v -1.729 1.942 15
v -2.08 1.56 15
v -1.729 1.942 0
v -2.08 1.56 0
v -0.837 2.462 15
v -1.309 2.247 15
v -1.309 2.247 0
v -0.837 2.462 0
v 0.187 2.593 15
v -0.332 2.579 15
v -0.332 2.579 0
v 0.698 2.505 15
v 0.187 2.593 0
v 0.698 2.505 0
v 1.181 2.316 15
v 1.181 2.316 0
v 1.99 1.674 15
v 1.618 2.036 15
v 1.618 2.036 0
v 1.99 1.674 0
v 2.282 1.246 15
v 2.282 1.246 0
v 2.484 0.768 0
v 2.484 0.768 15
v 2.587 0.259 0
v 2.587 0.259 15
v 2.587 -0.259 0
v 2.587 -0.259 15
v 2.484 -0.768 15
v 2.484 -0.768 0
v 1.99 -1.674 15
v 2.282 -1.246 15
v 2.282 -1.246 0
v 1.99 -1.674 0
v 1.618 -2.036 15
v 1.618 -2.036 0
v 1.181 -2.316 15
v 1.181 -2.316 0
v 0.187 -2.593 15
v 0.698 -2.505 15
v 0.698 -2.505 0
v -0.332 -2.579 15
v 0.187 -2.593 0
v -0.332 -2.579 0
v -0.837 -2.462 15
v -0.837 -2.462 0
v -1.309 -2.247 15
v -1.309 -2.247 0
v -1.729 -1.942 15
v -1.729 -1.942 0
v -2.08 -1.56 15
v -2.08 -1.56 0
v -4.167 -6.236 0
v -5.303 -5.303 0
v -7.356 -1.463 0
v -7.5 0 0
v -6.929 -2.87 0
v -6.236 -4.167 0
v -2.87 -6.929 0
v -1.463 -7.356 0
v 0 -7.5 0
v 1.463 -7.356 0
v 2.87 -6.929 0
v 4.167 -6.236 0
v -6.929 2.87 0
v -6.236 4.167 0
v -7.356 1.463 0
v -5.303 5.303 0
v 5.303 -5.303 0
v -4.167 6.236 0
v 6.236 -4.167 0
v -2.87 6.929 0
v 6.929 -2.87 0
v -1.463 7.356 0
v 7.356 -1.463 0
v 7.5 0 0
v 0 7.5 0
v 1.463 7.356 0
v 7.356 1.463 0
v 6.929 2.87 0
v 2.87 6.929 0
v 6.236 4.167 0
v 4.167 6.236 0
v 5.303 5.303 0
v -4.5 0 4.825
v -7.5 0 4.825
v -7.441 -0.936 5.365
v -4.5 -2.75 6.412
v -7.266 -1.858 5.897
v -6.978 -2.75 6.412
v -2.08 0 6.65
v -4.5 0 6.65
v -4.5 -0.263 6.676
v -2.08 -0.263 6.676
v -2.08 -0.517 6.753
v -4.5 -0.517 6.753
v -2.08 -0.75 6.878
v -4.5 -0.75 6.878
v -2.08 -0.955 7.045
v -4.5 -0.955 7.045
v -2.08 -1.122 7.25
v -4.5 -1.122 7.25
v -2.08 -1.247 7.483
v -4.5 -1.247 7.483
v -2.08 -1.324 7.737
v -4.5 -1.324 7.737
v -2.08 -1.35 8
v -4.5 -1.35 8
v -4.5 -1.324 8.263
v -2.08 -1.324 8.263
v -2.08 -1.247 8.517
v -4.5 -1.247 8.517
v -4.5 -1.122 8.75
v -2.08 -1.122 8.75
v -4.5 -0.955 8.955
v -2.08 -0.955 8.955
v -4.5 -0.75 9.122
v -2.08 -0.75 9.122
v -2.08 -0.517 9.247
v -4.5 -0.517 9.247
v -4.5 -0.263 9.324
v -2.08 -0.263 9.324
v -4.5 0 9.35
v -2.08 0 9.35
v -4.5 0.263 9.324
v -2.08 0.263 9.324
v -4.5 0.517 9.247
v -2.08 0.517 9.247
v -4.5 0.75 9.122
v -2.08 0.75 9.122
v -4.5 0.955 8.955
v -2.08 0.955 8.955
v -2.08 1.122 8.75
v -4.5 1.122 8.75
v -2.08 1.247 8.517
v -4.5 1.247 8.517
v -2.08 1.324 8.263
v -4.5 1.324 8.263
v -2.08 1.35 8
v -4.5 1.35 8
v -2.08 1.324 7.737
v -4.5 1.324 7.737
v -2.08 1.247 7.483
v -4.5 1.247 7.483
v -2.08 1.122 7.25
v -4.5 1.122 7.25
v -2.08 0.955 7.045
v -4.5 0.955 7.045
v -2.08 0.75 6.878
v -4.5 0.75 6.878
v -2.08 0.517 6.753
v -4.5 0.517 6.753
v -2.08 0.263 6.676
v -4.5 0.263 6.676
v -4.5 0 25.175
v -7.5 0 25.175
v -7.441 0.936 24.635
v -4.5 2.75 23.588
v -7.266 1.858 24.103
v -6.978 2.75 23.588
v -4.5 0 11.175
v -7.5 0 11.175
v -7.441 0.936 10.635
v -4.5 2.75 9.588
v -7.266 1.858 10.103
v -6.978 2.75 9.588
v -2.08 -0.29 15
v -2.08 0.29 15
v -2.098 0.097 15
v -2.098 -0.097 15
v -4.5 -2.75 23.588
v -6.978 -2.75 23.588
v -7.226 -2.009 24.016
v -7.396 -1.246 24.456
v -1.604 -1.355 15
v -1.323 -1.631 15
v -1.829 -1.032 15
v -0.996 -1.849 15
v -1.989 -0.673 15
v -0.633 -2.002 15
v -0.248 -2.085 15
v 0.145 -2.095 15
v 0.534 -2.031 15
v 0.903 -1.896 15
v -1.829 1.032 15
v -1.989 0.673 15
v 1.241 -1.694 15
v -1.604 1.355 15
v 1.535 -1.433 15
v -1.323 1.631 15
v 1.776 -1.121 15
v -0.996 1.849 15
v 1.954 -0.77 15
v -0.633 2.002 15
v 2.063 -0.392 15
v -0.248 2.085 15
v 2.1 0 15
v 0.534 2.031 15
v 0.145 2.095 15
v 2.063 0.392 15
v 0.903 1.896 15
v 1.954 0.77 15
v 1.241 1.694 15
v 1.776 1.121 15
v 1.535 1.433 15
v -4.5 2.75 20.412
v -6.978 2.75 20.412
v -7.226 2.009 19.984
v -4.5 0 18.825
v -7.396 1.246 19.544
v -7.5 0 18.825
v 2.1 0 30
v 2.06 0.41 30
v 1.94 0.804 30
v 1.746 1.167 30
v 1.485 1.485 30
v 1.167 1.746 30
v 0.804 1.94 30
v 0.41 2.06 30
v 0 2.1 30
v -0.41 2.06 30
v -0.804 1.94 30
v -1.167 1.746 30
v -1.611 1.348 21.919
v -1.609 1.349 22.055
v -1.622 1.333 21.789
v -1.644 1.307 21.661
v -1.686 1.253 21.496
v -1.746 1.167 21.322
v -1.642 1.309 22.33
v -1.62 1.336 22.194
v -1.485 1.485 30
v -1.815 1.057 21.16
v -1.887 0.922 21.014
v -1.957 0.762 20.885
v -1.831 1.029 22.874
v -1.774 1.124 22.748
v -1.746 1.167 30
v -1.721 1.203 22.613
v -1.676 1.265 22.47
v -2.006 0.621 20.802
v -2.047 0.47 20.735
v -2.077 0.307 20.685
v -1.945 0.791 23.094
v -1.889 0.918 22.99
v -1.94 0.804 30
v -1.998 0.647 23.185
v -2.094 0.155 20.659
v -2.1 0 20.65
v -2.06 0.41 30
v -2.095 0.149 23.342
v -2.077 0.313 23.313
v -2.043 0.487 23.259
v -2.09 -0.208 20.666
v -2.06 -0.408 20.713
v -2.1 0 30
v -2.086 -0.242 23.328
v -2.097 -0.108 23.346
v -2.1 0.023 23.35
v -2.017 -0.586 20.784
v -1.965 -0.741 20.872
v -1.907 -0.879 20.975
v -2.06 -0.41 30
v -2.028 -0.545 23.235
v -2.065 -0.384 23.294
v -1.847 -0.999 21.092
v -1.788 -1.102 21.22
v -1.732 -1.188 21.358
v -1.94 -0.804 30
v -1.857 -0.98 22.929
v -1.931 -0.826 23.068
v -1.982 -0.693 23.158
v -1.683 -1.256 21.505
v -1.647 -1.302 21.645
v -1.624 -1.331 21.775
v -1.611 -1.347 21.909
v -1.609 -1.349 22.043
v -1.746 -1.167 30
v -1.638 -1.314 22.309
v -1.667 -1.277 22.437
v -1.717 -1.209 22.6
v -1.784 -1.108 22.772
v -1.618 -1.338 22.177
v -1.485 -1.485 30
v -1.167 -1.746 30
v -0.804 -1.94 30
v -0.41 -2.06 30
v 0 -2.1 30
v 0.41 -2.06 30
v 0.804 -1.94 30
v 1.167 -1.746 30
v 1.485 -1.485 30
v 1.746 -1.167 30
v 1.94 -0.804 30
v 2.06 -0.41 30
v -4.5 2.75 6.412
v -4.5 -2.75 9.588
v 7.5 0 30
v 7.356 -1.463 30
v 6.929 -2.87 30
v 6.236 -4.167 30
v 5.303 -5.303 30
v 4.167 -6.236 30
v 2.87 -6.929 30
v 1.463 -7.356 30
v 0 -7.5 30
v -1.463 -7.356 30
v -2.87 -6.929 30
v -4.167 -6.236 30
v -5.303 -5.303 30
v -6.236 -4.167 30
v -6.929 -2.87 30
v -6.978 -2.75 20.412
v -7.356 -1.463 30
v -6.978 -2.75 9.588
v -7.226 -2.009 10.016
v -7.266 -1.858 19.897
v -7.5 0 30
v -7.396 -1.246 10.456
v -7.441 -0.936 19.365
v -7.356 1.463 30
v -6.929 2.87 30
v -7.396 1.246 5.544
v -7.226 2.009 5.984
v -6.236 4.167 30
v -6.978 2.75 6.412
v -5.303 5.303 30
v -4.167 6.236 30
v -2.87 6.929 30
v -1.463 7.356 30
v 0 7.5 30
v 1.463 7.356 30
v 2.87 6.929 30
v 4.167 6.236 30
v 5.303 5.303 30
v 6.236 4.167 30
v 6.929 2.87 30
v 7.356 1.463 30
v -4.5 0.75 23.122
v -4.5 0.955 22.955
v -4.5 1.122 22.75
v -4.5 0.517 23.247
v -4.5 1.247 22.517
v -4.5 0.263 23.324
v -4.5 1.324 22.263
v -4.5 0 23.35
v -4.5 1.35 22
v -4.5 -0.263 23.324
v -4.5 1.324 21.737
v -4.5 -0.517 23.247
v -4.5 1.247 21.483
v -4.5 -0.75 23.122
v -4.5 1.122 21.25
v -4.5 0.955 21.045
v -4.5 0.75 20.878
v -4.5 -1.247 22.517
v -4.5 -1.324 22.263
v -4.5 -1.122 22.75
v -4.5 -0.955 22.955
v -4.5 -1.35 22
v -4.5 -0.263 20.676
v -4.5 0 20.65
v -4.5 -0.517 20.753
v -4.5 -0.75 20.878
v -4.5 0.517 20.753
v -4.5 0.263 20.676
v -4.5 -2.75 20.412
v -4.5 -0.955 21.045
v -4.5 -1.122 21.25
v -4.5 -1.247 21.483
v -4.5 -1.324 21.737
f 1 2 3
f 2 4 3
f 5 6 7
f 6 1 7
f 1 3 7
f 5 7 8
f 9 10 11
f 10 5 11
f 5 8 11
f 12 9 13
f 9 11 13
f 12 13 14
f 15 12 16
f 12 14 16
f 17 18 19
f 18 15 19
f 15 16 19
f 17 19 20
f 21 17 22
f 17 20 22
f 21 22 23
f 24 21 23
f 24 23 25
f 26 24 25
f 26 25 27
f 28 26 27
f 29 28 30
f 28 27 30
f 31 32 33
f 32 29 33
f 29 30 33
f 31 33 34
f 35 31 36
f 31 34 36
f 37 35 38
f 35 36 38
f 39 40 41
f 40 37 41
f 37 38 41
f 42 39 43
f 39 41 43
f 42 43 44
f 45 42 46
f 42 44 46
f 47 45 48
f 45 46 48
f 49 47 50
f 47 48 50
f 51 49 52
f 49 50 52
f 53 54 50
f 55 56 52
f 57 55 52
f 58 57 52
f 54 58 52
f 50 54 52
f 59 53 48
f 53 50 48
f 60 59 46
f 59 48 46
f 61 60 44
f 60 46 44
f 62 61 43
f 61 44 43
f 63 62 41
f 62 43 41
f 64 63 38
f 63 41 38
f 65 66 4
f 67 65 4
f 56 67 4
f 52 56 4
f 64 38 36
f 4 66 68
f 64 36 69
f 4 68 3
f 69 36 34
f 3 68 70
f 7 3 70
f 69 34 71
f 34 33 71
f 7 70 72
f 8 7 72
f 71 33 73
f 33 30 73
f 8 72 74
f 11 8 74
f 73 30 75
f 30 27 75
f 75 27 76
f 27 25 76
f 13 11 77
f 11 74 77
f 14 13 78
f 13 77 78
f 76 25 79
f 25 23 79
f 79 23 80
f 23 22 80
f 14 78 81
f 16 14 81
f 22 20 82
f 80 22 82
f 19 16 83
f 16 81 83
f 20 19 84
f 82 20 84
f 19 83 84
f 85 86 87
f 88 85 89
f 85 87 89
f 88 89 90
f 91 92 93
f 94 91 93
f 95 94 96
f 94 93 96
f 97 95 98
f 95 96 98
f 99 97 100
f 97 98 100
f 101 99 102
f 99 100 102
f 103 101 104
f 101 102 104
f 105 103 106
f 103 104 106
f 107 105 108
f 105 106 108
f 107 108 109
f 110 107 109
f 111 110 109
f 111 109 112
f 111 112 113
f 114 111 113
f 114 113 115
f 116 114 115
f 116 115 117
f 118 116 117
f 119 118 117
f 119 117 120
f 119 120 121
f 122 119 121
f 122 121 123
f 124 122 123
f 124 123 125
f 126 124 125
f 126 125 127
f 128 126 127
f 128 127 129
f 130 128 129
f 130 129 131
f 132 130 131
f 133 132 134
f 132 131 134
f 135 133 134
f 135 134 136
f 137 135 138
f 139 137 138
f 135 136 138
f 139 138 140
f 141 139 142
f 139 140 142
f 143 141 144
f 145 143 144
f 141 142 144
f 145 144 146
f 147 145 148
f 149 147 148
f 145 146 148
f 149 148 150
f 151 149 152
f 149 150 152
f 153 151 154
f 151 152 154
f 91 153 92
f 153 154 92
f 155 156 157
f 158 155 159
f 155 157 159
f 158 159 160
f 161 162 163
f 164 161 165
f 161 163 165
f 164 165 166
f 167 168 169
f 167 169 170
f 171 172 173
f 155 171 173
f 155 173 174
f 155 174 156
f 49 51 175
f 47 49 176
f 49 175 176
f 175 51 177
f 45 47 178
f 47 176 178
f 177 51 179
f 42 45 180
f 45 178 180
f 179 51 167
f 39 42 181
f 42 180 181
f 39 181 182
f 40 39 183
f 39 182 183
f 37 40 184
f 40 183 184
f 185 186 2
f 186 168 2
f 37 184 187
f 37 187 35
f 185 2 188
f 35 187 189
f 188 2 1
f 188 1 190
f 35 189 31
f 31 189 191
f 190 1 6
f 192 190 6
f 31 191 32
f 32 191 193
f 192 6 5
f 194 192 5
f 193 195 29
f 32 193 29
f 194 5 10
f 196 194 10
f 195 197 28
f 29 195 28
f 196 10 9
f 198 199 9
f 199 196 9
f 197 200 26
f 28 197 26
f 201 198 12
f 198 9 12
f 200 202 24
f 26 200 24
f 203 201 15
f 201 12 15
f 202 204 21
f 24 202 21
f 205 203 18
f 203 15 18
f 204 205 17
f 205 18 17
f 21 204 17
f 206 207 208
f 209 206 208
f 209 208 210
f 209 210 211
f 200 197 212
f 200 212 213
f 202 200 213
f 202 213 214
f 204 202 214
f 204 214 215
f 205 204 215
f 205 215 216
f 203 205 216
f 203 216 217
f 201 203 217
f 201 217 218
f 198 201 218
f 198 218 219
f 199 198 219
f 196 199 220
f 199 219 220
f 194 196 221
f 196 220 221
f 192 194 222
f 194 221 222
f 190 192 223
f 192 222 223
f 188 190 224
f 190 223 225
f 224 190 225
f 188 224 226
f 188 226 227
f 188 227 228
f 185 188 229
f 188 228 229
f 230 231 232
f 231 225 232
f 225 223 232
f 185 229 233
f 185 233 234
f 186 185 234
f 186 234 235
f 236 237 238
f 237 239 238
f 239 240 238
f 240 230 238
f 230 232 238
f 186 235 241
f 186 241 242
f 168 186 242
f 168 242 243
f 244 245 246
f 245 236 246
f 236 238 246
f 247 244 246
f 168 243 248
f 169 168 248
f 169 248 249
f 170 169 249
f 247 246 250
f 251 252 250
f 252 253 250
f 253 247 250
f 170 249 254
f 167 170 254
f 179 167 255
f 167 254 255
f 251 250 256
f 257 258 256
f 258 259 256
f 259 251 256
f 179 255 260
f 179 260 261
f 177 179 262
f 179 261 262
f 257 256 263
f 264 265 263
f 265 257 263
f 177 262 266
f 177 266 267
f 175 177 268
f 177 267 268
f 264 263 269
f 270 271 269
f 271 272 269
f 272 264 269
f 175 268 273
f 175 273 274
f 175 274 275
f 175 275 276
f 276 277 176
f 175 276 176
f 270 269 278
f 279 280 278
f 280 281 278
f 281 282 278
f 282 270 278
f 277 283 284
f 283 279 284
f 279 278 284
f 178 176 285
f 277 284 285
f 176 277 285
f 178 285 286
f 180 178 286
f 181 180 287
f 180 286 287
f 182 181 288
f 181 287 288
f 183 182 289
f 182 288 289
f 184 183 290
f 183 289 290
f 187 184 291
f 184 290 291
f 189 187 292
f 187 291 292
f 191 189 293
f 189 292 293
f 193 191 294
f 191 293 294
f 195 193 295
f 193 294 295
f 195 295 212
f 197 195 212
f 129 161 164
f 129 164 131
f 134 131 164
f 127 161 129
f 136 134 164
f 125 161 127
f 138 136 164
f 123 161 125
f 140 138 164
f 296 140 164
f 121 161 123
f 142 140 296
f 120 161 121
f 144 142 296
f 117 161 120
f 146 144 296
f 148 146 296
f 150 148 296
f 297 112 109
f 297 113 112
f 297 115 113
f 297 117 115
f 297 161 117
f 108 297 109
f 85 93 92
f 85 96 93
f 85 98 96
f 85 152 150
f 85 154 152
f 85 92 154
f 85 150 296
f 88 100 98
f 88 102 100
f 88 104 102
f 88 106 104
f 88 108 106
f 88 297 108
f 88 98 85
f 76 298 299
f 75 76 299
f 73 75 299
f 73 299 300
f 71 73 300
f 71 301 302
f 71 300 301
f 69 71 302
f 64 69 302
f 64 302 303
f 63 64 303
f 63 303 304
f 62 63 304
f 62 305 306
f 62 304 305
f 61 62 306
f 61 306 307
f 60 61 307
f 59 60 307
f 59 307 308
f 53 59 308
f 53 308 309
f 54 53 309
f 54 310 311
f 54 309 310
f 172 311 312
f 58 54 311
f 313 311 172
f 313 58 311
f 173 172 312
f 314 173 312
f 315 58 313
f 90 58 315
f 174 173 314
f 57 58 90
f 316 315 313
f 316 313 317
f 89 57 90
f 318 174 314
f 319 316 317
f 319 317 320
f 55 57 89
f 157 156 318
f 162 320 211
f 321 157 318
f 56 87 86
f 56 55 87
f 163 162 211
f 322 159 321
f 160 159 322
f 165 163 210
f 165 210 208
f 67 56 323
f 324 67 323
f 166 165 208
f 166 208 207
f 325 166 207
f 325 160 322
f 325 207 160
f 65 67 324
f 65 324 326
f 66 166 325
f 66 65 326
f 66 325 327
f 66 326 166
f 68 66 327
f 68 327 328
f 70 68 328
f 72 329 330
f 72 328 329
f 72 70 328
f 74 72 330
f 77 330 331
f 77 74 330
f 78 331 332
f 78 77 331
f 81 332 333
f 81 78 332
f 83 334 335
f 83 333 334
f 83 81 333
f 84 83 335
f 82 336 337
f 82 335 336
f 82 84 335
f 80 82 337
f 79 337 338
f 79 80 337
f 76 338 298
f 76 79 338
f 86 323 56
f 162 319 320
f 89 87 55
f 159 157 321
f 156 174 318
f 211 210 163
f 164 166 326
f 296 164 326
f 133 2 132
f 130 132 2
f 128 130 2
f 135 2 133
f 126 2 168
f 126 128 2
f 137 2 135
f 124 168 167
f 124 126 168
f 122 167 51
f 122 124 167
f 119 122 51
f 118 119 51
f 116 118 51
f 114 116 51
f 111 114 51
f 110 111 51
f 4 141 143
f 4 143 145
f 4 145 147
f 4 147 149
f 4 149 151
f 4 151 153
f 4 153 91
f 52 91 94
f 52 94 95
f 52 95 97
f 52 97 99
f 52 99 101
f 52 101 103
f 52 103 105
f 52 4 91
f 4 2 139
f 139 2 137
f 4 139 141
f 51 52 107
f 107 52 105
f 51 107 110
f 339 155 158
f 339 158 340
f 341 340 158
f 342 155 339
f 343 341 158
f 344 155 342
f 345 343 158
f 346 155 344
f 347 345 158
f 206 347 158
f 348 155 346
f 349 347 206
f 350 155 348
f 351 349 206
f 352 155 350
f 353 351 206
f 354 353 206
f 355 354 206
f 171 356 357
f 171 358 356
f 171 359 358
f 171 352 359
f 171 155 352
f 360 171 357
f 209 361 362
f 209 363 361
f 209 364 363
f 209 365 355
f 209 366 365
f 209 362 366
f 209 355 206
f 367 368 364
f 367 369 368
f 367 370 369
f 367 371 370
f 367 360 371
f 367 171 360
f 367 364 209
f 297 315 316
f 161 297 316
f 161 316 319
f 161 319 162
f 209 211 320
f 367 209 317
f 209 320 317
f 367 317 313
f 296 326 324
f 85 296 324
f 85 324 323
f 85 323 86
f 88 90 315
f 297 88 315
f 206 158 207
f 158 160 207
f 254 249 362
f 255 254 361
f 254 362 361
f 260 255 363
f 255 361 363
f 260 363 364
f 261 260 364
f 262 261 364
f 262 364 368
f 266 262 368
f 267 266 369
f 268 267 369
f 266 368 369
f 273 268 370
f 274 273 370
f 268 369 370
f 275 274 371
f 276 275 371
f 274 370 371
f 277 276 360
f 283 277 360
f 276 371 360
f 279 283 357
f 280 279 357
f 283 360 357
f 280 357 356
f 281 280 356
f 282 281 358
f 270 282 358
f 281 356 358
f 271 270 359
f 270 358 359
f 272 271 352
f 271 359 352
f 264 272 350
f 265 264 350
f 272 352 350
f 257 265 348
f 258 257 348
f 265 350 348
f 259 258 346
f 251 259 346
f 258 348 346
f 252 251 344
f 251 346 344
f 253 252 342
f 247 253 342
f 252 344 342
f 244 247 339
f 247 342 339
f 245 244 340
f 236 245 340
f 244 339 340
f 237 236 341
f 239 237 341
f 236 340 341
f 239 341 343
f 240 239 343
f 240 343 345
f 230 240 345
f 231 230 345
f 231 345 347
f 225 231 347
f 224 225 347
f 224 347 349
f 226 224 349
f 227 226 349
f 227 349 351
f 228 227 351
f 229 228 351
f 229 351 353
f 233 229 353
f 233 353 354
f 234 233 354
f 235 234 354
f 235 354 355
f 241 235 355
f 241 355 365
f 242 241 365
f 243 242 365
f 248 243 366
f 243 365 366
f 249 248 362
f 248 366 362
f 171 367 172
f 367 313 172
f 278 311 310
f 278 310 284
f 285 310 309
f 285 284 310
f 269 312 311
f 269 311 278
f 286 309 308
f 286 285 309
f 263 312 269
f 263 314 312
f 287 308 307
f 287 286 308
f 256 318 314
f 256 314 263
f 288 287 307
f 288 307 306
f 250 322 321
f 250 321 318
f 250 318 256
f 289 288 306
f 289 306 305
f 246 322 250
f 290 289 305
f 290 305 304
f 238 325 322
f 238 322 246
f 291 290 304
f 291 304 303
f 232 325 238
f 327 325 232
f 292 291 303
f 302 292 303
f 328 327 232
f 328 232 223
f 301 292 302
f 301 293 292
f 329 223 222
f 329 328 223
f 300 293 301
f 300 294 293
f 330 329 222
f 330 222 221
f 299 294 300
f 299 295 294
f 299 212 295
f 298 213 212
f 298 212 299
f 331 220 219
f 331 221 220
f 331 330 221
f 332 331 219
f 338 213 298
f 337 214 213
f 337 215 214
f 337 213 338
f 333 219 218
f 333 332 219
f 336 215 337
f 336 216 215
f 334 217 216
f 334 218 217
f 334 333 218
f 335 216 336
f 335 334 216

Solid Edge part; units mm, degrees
sketch "Sketch1" plane through (0, 0, 0) normal (0, 0, 1) x (1, 0, 0)
  circle A0 centre (0, 0) radius 7.5
  dimension "D1" = 15
extrude "Protrusion1" add sketch "Sketch1" along normal blind 30
sketch "Sketch2" plane through (0, 0, 30) normal (0, 0, 1) x (1, 0, 0)
  circle A0 centre (0, 0) radius 2.1
  dimension "D1" = 4.2
extrude "ExtrudedCutout_1" cut sketch "Sketch2" against normal blind 15
sketch "Sketch3" plane through (0, 0, 0) normal (0, 0, -1) x (1, 0, 0)
  line L0 (-2.0799, -1.5601) -> (-2.0799, 1.5601)
  arc A0 (-2.0799, 1.5601) -> (-2.0799, -1.5601) centre (0, 0) cw
extrude "Cutout1" cut sketch "Sketch3" against normal up to vertex (15 mm away)
sketch "Sketch4" plane through (-7.5, 0, 15) normal (-1, 0, 0) x (0, 0, -1)
  line L0 (5.4123, 2.75) -> (3.8246, 0)
  line L1 (3.8246, 0) -> (5.4123, -2.75)
  line L2 (5.4123, -2.75) -> (8.5877, -2.75)
  line L3 (8.5877, -2.75) -> (10.1754, 0)
  line L4 (10.1754, 0) -> (8.5877, 2.75)
  line L5 (8.5877, 2.75) -> (5.4123, 2.75)
  line L6 (-8.5877, 2.75) -> (-10.1754, 0)
  line L7 (-10.1754, 0) -> (-8.5877, -2.75)
  line L8 (-8.5877, -2.75) -> (-5.4123, -2.75)
  line L9 (-5.4123, -2.75) -> (-3.8246, 0)
  line L10 (-3.8246, 0) -> (-5.4123, 2.75)
  line L11 (-5.4123, 2.75) -> (-8.5877, 2.75)
extrude "ExtrudedCutout_3" cut sketch "Sketch4" against normal blind 3
sketch "Sketch5" plane through (-7.5, 0, 15) normal (-1, 0, 0) x (0, 0, -1)
  circle A0 centre (-7, 0) radius 1.35
  circle A1 centre (7, 0) radius 1.35
  dimension "D1" = 2.7
  dimension "D2" = 2.7
extrude "Cutout2" cut sketch "Sketch5" against normal up to next
